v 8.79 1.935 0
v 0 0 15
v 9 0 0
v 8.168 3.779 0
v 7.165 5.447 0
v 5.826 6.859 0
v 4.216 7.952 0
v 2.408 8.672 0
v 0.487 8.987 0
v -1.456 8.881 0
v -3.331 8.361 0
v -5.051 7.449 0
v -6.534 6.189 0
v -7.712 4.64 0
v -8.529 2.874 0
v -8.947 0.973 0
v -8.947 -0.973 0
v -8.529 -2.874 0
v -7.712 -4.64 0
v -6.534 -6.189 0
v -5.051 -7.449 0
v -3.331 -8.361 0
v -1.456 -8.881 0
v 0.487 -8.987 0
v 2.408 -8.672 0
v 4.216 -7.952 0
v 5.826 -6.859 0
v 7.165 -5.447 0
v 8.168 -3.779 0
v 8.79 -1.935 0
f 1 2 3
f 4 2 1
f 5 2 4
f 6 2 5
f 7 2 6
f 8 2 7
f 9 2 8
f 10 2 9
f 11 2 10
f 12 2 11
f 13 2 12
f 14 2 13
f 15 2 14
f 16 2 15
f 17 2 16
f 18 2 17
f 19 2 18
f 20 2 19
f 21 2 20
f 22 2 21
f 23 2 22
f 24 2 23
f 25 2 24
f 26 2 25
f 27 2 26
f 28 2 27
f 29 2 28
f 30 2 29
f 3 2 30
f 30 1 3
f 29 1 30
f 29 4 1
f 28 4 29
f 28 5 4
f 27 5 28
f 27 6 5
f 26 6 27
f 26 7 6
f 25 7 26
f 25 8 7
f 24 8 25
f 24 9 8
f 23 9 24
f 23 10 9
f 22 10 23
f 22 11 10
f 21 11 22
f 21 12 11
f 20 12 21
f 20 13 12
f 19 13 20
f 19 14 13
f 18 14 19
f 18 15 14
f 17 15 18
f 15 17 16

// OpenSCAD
// Generated by SolidPython 1.0.1 on 2020-07-29 00:46:43


cylinder(h = 15, r1 = 9, r2 = 0);
/***********************************************
*********      SolidPython code:      **********
************************************************
 
# import packages: SolidPython
from solid import *
from solid.utils import *
from itertools import chain, combinations, permutations


class Resize:

    def __init__(self, scad_file):
        self.scad_file = scad_file
        #self.scad_file = import_scad(scad_file)
        # cone/cylinder param:
        self.r1 = 0
        self.r2 = 0
        self.h = 0
        # rectangular prism param:
        self.w = 0
        self.l = 0
        # ellipse param:
        self.r = 0

    # import OpenScad code (file name corresponds to shape)


    # classify shape + parameters
    def assign(self, param1, param2, param3):
        if self.scad_file == 'cone.scad':
            self.r1 = param1
            self.r2 = param2
            self.h = param3
        elif self.scad_file == 'cylinder.scad':
            self.r1 = param1
            self.r2 = param2
            self.h = param3
        elif self.scad_file == 'rectangularPrism.scad':
            self.h = param1
            self.l = param2
            self.w = param3
        else:
            self.r = param1
            self.h = param2

    # resize parameters
    def iterate(self):
        x = range(3, 20, 2)
        i = 1
        if self.scad_file == 'cone.scad':
            tempList = list(permutations(x, 2))
            for temp in tempList:
                param1 = temp[0]
                param2 = temp[1]
                filepath = 'produced_scad_files/' + 'cone' + str(param1) + '_' + str(param2) + '_' + '.scad'
                scad_render_to_file(cylinder(h=param1, r1=param2, r2=0), filepath)

        elif self.scad_file == 'cylinder.scad':
            tempList = list(permutations(x, 3))
            for temp in tempList:
                param1 = temp[0]
                param2 = temp[1]
                filepath = 'produced_scad_files/' + 'cylinder' + str(param1) + '_' + str(param2) + '_' + '.scad'
                scad_render_to_file(cylinder(h=param1, r1=param2, r2=param2), filepath)

        elif self.scad_file == 'rectangularPrism.scad':
            tempList = list(permutations(x, 3))
            for temp in tempList:
                param1 = temp[0]
                param2 = temp[1]
                param3 = temp[2]
                filepath = 'produced_scad_files/' + 'rectangularPrism' + str(param1) + '_' + str(param2) + '_' + str(
                    param3) + '.scad'
                scad_render_to_file(cube(size=(param1, param2, param3)), filepath)

        elif self.scad_file == 'ellipse.scad':
            tempList = list(permutations(x, 4))
            for temp in tempList:
                param1 = temp[0]
                param2 = temp[1]
                param3 = temp[2]
                param4 = temp[3]
                filepath = 'produced_scad_files/' + 'ellipse' + str(param1) + '_' + str(param2) + '_' + str(param3) + '_' + str(param4) + '.scad'
                scad_render_to_file(scale([param1, param2, param3])(sphere(r=param4)), filepath)

    def render_to_scadfile(self):
        scad_render_to_file(scad, 'example.scad') 
 
************************************************/
